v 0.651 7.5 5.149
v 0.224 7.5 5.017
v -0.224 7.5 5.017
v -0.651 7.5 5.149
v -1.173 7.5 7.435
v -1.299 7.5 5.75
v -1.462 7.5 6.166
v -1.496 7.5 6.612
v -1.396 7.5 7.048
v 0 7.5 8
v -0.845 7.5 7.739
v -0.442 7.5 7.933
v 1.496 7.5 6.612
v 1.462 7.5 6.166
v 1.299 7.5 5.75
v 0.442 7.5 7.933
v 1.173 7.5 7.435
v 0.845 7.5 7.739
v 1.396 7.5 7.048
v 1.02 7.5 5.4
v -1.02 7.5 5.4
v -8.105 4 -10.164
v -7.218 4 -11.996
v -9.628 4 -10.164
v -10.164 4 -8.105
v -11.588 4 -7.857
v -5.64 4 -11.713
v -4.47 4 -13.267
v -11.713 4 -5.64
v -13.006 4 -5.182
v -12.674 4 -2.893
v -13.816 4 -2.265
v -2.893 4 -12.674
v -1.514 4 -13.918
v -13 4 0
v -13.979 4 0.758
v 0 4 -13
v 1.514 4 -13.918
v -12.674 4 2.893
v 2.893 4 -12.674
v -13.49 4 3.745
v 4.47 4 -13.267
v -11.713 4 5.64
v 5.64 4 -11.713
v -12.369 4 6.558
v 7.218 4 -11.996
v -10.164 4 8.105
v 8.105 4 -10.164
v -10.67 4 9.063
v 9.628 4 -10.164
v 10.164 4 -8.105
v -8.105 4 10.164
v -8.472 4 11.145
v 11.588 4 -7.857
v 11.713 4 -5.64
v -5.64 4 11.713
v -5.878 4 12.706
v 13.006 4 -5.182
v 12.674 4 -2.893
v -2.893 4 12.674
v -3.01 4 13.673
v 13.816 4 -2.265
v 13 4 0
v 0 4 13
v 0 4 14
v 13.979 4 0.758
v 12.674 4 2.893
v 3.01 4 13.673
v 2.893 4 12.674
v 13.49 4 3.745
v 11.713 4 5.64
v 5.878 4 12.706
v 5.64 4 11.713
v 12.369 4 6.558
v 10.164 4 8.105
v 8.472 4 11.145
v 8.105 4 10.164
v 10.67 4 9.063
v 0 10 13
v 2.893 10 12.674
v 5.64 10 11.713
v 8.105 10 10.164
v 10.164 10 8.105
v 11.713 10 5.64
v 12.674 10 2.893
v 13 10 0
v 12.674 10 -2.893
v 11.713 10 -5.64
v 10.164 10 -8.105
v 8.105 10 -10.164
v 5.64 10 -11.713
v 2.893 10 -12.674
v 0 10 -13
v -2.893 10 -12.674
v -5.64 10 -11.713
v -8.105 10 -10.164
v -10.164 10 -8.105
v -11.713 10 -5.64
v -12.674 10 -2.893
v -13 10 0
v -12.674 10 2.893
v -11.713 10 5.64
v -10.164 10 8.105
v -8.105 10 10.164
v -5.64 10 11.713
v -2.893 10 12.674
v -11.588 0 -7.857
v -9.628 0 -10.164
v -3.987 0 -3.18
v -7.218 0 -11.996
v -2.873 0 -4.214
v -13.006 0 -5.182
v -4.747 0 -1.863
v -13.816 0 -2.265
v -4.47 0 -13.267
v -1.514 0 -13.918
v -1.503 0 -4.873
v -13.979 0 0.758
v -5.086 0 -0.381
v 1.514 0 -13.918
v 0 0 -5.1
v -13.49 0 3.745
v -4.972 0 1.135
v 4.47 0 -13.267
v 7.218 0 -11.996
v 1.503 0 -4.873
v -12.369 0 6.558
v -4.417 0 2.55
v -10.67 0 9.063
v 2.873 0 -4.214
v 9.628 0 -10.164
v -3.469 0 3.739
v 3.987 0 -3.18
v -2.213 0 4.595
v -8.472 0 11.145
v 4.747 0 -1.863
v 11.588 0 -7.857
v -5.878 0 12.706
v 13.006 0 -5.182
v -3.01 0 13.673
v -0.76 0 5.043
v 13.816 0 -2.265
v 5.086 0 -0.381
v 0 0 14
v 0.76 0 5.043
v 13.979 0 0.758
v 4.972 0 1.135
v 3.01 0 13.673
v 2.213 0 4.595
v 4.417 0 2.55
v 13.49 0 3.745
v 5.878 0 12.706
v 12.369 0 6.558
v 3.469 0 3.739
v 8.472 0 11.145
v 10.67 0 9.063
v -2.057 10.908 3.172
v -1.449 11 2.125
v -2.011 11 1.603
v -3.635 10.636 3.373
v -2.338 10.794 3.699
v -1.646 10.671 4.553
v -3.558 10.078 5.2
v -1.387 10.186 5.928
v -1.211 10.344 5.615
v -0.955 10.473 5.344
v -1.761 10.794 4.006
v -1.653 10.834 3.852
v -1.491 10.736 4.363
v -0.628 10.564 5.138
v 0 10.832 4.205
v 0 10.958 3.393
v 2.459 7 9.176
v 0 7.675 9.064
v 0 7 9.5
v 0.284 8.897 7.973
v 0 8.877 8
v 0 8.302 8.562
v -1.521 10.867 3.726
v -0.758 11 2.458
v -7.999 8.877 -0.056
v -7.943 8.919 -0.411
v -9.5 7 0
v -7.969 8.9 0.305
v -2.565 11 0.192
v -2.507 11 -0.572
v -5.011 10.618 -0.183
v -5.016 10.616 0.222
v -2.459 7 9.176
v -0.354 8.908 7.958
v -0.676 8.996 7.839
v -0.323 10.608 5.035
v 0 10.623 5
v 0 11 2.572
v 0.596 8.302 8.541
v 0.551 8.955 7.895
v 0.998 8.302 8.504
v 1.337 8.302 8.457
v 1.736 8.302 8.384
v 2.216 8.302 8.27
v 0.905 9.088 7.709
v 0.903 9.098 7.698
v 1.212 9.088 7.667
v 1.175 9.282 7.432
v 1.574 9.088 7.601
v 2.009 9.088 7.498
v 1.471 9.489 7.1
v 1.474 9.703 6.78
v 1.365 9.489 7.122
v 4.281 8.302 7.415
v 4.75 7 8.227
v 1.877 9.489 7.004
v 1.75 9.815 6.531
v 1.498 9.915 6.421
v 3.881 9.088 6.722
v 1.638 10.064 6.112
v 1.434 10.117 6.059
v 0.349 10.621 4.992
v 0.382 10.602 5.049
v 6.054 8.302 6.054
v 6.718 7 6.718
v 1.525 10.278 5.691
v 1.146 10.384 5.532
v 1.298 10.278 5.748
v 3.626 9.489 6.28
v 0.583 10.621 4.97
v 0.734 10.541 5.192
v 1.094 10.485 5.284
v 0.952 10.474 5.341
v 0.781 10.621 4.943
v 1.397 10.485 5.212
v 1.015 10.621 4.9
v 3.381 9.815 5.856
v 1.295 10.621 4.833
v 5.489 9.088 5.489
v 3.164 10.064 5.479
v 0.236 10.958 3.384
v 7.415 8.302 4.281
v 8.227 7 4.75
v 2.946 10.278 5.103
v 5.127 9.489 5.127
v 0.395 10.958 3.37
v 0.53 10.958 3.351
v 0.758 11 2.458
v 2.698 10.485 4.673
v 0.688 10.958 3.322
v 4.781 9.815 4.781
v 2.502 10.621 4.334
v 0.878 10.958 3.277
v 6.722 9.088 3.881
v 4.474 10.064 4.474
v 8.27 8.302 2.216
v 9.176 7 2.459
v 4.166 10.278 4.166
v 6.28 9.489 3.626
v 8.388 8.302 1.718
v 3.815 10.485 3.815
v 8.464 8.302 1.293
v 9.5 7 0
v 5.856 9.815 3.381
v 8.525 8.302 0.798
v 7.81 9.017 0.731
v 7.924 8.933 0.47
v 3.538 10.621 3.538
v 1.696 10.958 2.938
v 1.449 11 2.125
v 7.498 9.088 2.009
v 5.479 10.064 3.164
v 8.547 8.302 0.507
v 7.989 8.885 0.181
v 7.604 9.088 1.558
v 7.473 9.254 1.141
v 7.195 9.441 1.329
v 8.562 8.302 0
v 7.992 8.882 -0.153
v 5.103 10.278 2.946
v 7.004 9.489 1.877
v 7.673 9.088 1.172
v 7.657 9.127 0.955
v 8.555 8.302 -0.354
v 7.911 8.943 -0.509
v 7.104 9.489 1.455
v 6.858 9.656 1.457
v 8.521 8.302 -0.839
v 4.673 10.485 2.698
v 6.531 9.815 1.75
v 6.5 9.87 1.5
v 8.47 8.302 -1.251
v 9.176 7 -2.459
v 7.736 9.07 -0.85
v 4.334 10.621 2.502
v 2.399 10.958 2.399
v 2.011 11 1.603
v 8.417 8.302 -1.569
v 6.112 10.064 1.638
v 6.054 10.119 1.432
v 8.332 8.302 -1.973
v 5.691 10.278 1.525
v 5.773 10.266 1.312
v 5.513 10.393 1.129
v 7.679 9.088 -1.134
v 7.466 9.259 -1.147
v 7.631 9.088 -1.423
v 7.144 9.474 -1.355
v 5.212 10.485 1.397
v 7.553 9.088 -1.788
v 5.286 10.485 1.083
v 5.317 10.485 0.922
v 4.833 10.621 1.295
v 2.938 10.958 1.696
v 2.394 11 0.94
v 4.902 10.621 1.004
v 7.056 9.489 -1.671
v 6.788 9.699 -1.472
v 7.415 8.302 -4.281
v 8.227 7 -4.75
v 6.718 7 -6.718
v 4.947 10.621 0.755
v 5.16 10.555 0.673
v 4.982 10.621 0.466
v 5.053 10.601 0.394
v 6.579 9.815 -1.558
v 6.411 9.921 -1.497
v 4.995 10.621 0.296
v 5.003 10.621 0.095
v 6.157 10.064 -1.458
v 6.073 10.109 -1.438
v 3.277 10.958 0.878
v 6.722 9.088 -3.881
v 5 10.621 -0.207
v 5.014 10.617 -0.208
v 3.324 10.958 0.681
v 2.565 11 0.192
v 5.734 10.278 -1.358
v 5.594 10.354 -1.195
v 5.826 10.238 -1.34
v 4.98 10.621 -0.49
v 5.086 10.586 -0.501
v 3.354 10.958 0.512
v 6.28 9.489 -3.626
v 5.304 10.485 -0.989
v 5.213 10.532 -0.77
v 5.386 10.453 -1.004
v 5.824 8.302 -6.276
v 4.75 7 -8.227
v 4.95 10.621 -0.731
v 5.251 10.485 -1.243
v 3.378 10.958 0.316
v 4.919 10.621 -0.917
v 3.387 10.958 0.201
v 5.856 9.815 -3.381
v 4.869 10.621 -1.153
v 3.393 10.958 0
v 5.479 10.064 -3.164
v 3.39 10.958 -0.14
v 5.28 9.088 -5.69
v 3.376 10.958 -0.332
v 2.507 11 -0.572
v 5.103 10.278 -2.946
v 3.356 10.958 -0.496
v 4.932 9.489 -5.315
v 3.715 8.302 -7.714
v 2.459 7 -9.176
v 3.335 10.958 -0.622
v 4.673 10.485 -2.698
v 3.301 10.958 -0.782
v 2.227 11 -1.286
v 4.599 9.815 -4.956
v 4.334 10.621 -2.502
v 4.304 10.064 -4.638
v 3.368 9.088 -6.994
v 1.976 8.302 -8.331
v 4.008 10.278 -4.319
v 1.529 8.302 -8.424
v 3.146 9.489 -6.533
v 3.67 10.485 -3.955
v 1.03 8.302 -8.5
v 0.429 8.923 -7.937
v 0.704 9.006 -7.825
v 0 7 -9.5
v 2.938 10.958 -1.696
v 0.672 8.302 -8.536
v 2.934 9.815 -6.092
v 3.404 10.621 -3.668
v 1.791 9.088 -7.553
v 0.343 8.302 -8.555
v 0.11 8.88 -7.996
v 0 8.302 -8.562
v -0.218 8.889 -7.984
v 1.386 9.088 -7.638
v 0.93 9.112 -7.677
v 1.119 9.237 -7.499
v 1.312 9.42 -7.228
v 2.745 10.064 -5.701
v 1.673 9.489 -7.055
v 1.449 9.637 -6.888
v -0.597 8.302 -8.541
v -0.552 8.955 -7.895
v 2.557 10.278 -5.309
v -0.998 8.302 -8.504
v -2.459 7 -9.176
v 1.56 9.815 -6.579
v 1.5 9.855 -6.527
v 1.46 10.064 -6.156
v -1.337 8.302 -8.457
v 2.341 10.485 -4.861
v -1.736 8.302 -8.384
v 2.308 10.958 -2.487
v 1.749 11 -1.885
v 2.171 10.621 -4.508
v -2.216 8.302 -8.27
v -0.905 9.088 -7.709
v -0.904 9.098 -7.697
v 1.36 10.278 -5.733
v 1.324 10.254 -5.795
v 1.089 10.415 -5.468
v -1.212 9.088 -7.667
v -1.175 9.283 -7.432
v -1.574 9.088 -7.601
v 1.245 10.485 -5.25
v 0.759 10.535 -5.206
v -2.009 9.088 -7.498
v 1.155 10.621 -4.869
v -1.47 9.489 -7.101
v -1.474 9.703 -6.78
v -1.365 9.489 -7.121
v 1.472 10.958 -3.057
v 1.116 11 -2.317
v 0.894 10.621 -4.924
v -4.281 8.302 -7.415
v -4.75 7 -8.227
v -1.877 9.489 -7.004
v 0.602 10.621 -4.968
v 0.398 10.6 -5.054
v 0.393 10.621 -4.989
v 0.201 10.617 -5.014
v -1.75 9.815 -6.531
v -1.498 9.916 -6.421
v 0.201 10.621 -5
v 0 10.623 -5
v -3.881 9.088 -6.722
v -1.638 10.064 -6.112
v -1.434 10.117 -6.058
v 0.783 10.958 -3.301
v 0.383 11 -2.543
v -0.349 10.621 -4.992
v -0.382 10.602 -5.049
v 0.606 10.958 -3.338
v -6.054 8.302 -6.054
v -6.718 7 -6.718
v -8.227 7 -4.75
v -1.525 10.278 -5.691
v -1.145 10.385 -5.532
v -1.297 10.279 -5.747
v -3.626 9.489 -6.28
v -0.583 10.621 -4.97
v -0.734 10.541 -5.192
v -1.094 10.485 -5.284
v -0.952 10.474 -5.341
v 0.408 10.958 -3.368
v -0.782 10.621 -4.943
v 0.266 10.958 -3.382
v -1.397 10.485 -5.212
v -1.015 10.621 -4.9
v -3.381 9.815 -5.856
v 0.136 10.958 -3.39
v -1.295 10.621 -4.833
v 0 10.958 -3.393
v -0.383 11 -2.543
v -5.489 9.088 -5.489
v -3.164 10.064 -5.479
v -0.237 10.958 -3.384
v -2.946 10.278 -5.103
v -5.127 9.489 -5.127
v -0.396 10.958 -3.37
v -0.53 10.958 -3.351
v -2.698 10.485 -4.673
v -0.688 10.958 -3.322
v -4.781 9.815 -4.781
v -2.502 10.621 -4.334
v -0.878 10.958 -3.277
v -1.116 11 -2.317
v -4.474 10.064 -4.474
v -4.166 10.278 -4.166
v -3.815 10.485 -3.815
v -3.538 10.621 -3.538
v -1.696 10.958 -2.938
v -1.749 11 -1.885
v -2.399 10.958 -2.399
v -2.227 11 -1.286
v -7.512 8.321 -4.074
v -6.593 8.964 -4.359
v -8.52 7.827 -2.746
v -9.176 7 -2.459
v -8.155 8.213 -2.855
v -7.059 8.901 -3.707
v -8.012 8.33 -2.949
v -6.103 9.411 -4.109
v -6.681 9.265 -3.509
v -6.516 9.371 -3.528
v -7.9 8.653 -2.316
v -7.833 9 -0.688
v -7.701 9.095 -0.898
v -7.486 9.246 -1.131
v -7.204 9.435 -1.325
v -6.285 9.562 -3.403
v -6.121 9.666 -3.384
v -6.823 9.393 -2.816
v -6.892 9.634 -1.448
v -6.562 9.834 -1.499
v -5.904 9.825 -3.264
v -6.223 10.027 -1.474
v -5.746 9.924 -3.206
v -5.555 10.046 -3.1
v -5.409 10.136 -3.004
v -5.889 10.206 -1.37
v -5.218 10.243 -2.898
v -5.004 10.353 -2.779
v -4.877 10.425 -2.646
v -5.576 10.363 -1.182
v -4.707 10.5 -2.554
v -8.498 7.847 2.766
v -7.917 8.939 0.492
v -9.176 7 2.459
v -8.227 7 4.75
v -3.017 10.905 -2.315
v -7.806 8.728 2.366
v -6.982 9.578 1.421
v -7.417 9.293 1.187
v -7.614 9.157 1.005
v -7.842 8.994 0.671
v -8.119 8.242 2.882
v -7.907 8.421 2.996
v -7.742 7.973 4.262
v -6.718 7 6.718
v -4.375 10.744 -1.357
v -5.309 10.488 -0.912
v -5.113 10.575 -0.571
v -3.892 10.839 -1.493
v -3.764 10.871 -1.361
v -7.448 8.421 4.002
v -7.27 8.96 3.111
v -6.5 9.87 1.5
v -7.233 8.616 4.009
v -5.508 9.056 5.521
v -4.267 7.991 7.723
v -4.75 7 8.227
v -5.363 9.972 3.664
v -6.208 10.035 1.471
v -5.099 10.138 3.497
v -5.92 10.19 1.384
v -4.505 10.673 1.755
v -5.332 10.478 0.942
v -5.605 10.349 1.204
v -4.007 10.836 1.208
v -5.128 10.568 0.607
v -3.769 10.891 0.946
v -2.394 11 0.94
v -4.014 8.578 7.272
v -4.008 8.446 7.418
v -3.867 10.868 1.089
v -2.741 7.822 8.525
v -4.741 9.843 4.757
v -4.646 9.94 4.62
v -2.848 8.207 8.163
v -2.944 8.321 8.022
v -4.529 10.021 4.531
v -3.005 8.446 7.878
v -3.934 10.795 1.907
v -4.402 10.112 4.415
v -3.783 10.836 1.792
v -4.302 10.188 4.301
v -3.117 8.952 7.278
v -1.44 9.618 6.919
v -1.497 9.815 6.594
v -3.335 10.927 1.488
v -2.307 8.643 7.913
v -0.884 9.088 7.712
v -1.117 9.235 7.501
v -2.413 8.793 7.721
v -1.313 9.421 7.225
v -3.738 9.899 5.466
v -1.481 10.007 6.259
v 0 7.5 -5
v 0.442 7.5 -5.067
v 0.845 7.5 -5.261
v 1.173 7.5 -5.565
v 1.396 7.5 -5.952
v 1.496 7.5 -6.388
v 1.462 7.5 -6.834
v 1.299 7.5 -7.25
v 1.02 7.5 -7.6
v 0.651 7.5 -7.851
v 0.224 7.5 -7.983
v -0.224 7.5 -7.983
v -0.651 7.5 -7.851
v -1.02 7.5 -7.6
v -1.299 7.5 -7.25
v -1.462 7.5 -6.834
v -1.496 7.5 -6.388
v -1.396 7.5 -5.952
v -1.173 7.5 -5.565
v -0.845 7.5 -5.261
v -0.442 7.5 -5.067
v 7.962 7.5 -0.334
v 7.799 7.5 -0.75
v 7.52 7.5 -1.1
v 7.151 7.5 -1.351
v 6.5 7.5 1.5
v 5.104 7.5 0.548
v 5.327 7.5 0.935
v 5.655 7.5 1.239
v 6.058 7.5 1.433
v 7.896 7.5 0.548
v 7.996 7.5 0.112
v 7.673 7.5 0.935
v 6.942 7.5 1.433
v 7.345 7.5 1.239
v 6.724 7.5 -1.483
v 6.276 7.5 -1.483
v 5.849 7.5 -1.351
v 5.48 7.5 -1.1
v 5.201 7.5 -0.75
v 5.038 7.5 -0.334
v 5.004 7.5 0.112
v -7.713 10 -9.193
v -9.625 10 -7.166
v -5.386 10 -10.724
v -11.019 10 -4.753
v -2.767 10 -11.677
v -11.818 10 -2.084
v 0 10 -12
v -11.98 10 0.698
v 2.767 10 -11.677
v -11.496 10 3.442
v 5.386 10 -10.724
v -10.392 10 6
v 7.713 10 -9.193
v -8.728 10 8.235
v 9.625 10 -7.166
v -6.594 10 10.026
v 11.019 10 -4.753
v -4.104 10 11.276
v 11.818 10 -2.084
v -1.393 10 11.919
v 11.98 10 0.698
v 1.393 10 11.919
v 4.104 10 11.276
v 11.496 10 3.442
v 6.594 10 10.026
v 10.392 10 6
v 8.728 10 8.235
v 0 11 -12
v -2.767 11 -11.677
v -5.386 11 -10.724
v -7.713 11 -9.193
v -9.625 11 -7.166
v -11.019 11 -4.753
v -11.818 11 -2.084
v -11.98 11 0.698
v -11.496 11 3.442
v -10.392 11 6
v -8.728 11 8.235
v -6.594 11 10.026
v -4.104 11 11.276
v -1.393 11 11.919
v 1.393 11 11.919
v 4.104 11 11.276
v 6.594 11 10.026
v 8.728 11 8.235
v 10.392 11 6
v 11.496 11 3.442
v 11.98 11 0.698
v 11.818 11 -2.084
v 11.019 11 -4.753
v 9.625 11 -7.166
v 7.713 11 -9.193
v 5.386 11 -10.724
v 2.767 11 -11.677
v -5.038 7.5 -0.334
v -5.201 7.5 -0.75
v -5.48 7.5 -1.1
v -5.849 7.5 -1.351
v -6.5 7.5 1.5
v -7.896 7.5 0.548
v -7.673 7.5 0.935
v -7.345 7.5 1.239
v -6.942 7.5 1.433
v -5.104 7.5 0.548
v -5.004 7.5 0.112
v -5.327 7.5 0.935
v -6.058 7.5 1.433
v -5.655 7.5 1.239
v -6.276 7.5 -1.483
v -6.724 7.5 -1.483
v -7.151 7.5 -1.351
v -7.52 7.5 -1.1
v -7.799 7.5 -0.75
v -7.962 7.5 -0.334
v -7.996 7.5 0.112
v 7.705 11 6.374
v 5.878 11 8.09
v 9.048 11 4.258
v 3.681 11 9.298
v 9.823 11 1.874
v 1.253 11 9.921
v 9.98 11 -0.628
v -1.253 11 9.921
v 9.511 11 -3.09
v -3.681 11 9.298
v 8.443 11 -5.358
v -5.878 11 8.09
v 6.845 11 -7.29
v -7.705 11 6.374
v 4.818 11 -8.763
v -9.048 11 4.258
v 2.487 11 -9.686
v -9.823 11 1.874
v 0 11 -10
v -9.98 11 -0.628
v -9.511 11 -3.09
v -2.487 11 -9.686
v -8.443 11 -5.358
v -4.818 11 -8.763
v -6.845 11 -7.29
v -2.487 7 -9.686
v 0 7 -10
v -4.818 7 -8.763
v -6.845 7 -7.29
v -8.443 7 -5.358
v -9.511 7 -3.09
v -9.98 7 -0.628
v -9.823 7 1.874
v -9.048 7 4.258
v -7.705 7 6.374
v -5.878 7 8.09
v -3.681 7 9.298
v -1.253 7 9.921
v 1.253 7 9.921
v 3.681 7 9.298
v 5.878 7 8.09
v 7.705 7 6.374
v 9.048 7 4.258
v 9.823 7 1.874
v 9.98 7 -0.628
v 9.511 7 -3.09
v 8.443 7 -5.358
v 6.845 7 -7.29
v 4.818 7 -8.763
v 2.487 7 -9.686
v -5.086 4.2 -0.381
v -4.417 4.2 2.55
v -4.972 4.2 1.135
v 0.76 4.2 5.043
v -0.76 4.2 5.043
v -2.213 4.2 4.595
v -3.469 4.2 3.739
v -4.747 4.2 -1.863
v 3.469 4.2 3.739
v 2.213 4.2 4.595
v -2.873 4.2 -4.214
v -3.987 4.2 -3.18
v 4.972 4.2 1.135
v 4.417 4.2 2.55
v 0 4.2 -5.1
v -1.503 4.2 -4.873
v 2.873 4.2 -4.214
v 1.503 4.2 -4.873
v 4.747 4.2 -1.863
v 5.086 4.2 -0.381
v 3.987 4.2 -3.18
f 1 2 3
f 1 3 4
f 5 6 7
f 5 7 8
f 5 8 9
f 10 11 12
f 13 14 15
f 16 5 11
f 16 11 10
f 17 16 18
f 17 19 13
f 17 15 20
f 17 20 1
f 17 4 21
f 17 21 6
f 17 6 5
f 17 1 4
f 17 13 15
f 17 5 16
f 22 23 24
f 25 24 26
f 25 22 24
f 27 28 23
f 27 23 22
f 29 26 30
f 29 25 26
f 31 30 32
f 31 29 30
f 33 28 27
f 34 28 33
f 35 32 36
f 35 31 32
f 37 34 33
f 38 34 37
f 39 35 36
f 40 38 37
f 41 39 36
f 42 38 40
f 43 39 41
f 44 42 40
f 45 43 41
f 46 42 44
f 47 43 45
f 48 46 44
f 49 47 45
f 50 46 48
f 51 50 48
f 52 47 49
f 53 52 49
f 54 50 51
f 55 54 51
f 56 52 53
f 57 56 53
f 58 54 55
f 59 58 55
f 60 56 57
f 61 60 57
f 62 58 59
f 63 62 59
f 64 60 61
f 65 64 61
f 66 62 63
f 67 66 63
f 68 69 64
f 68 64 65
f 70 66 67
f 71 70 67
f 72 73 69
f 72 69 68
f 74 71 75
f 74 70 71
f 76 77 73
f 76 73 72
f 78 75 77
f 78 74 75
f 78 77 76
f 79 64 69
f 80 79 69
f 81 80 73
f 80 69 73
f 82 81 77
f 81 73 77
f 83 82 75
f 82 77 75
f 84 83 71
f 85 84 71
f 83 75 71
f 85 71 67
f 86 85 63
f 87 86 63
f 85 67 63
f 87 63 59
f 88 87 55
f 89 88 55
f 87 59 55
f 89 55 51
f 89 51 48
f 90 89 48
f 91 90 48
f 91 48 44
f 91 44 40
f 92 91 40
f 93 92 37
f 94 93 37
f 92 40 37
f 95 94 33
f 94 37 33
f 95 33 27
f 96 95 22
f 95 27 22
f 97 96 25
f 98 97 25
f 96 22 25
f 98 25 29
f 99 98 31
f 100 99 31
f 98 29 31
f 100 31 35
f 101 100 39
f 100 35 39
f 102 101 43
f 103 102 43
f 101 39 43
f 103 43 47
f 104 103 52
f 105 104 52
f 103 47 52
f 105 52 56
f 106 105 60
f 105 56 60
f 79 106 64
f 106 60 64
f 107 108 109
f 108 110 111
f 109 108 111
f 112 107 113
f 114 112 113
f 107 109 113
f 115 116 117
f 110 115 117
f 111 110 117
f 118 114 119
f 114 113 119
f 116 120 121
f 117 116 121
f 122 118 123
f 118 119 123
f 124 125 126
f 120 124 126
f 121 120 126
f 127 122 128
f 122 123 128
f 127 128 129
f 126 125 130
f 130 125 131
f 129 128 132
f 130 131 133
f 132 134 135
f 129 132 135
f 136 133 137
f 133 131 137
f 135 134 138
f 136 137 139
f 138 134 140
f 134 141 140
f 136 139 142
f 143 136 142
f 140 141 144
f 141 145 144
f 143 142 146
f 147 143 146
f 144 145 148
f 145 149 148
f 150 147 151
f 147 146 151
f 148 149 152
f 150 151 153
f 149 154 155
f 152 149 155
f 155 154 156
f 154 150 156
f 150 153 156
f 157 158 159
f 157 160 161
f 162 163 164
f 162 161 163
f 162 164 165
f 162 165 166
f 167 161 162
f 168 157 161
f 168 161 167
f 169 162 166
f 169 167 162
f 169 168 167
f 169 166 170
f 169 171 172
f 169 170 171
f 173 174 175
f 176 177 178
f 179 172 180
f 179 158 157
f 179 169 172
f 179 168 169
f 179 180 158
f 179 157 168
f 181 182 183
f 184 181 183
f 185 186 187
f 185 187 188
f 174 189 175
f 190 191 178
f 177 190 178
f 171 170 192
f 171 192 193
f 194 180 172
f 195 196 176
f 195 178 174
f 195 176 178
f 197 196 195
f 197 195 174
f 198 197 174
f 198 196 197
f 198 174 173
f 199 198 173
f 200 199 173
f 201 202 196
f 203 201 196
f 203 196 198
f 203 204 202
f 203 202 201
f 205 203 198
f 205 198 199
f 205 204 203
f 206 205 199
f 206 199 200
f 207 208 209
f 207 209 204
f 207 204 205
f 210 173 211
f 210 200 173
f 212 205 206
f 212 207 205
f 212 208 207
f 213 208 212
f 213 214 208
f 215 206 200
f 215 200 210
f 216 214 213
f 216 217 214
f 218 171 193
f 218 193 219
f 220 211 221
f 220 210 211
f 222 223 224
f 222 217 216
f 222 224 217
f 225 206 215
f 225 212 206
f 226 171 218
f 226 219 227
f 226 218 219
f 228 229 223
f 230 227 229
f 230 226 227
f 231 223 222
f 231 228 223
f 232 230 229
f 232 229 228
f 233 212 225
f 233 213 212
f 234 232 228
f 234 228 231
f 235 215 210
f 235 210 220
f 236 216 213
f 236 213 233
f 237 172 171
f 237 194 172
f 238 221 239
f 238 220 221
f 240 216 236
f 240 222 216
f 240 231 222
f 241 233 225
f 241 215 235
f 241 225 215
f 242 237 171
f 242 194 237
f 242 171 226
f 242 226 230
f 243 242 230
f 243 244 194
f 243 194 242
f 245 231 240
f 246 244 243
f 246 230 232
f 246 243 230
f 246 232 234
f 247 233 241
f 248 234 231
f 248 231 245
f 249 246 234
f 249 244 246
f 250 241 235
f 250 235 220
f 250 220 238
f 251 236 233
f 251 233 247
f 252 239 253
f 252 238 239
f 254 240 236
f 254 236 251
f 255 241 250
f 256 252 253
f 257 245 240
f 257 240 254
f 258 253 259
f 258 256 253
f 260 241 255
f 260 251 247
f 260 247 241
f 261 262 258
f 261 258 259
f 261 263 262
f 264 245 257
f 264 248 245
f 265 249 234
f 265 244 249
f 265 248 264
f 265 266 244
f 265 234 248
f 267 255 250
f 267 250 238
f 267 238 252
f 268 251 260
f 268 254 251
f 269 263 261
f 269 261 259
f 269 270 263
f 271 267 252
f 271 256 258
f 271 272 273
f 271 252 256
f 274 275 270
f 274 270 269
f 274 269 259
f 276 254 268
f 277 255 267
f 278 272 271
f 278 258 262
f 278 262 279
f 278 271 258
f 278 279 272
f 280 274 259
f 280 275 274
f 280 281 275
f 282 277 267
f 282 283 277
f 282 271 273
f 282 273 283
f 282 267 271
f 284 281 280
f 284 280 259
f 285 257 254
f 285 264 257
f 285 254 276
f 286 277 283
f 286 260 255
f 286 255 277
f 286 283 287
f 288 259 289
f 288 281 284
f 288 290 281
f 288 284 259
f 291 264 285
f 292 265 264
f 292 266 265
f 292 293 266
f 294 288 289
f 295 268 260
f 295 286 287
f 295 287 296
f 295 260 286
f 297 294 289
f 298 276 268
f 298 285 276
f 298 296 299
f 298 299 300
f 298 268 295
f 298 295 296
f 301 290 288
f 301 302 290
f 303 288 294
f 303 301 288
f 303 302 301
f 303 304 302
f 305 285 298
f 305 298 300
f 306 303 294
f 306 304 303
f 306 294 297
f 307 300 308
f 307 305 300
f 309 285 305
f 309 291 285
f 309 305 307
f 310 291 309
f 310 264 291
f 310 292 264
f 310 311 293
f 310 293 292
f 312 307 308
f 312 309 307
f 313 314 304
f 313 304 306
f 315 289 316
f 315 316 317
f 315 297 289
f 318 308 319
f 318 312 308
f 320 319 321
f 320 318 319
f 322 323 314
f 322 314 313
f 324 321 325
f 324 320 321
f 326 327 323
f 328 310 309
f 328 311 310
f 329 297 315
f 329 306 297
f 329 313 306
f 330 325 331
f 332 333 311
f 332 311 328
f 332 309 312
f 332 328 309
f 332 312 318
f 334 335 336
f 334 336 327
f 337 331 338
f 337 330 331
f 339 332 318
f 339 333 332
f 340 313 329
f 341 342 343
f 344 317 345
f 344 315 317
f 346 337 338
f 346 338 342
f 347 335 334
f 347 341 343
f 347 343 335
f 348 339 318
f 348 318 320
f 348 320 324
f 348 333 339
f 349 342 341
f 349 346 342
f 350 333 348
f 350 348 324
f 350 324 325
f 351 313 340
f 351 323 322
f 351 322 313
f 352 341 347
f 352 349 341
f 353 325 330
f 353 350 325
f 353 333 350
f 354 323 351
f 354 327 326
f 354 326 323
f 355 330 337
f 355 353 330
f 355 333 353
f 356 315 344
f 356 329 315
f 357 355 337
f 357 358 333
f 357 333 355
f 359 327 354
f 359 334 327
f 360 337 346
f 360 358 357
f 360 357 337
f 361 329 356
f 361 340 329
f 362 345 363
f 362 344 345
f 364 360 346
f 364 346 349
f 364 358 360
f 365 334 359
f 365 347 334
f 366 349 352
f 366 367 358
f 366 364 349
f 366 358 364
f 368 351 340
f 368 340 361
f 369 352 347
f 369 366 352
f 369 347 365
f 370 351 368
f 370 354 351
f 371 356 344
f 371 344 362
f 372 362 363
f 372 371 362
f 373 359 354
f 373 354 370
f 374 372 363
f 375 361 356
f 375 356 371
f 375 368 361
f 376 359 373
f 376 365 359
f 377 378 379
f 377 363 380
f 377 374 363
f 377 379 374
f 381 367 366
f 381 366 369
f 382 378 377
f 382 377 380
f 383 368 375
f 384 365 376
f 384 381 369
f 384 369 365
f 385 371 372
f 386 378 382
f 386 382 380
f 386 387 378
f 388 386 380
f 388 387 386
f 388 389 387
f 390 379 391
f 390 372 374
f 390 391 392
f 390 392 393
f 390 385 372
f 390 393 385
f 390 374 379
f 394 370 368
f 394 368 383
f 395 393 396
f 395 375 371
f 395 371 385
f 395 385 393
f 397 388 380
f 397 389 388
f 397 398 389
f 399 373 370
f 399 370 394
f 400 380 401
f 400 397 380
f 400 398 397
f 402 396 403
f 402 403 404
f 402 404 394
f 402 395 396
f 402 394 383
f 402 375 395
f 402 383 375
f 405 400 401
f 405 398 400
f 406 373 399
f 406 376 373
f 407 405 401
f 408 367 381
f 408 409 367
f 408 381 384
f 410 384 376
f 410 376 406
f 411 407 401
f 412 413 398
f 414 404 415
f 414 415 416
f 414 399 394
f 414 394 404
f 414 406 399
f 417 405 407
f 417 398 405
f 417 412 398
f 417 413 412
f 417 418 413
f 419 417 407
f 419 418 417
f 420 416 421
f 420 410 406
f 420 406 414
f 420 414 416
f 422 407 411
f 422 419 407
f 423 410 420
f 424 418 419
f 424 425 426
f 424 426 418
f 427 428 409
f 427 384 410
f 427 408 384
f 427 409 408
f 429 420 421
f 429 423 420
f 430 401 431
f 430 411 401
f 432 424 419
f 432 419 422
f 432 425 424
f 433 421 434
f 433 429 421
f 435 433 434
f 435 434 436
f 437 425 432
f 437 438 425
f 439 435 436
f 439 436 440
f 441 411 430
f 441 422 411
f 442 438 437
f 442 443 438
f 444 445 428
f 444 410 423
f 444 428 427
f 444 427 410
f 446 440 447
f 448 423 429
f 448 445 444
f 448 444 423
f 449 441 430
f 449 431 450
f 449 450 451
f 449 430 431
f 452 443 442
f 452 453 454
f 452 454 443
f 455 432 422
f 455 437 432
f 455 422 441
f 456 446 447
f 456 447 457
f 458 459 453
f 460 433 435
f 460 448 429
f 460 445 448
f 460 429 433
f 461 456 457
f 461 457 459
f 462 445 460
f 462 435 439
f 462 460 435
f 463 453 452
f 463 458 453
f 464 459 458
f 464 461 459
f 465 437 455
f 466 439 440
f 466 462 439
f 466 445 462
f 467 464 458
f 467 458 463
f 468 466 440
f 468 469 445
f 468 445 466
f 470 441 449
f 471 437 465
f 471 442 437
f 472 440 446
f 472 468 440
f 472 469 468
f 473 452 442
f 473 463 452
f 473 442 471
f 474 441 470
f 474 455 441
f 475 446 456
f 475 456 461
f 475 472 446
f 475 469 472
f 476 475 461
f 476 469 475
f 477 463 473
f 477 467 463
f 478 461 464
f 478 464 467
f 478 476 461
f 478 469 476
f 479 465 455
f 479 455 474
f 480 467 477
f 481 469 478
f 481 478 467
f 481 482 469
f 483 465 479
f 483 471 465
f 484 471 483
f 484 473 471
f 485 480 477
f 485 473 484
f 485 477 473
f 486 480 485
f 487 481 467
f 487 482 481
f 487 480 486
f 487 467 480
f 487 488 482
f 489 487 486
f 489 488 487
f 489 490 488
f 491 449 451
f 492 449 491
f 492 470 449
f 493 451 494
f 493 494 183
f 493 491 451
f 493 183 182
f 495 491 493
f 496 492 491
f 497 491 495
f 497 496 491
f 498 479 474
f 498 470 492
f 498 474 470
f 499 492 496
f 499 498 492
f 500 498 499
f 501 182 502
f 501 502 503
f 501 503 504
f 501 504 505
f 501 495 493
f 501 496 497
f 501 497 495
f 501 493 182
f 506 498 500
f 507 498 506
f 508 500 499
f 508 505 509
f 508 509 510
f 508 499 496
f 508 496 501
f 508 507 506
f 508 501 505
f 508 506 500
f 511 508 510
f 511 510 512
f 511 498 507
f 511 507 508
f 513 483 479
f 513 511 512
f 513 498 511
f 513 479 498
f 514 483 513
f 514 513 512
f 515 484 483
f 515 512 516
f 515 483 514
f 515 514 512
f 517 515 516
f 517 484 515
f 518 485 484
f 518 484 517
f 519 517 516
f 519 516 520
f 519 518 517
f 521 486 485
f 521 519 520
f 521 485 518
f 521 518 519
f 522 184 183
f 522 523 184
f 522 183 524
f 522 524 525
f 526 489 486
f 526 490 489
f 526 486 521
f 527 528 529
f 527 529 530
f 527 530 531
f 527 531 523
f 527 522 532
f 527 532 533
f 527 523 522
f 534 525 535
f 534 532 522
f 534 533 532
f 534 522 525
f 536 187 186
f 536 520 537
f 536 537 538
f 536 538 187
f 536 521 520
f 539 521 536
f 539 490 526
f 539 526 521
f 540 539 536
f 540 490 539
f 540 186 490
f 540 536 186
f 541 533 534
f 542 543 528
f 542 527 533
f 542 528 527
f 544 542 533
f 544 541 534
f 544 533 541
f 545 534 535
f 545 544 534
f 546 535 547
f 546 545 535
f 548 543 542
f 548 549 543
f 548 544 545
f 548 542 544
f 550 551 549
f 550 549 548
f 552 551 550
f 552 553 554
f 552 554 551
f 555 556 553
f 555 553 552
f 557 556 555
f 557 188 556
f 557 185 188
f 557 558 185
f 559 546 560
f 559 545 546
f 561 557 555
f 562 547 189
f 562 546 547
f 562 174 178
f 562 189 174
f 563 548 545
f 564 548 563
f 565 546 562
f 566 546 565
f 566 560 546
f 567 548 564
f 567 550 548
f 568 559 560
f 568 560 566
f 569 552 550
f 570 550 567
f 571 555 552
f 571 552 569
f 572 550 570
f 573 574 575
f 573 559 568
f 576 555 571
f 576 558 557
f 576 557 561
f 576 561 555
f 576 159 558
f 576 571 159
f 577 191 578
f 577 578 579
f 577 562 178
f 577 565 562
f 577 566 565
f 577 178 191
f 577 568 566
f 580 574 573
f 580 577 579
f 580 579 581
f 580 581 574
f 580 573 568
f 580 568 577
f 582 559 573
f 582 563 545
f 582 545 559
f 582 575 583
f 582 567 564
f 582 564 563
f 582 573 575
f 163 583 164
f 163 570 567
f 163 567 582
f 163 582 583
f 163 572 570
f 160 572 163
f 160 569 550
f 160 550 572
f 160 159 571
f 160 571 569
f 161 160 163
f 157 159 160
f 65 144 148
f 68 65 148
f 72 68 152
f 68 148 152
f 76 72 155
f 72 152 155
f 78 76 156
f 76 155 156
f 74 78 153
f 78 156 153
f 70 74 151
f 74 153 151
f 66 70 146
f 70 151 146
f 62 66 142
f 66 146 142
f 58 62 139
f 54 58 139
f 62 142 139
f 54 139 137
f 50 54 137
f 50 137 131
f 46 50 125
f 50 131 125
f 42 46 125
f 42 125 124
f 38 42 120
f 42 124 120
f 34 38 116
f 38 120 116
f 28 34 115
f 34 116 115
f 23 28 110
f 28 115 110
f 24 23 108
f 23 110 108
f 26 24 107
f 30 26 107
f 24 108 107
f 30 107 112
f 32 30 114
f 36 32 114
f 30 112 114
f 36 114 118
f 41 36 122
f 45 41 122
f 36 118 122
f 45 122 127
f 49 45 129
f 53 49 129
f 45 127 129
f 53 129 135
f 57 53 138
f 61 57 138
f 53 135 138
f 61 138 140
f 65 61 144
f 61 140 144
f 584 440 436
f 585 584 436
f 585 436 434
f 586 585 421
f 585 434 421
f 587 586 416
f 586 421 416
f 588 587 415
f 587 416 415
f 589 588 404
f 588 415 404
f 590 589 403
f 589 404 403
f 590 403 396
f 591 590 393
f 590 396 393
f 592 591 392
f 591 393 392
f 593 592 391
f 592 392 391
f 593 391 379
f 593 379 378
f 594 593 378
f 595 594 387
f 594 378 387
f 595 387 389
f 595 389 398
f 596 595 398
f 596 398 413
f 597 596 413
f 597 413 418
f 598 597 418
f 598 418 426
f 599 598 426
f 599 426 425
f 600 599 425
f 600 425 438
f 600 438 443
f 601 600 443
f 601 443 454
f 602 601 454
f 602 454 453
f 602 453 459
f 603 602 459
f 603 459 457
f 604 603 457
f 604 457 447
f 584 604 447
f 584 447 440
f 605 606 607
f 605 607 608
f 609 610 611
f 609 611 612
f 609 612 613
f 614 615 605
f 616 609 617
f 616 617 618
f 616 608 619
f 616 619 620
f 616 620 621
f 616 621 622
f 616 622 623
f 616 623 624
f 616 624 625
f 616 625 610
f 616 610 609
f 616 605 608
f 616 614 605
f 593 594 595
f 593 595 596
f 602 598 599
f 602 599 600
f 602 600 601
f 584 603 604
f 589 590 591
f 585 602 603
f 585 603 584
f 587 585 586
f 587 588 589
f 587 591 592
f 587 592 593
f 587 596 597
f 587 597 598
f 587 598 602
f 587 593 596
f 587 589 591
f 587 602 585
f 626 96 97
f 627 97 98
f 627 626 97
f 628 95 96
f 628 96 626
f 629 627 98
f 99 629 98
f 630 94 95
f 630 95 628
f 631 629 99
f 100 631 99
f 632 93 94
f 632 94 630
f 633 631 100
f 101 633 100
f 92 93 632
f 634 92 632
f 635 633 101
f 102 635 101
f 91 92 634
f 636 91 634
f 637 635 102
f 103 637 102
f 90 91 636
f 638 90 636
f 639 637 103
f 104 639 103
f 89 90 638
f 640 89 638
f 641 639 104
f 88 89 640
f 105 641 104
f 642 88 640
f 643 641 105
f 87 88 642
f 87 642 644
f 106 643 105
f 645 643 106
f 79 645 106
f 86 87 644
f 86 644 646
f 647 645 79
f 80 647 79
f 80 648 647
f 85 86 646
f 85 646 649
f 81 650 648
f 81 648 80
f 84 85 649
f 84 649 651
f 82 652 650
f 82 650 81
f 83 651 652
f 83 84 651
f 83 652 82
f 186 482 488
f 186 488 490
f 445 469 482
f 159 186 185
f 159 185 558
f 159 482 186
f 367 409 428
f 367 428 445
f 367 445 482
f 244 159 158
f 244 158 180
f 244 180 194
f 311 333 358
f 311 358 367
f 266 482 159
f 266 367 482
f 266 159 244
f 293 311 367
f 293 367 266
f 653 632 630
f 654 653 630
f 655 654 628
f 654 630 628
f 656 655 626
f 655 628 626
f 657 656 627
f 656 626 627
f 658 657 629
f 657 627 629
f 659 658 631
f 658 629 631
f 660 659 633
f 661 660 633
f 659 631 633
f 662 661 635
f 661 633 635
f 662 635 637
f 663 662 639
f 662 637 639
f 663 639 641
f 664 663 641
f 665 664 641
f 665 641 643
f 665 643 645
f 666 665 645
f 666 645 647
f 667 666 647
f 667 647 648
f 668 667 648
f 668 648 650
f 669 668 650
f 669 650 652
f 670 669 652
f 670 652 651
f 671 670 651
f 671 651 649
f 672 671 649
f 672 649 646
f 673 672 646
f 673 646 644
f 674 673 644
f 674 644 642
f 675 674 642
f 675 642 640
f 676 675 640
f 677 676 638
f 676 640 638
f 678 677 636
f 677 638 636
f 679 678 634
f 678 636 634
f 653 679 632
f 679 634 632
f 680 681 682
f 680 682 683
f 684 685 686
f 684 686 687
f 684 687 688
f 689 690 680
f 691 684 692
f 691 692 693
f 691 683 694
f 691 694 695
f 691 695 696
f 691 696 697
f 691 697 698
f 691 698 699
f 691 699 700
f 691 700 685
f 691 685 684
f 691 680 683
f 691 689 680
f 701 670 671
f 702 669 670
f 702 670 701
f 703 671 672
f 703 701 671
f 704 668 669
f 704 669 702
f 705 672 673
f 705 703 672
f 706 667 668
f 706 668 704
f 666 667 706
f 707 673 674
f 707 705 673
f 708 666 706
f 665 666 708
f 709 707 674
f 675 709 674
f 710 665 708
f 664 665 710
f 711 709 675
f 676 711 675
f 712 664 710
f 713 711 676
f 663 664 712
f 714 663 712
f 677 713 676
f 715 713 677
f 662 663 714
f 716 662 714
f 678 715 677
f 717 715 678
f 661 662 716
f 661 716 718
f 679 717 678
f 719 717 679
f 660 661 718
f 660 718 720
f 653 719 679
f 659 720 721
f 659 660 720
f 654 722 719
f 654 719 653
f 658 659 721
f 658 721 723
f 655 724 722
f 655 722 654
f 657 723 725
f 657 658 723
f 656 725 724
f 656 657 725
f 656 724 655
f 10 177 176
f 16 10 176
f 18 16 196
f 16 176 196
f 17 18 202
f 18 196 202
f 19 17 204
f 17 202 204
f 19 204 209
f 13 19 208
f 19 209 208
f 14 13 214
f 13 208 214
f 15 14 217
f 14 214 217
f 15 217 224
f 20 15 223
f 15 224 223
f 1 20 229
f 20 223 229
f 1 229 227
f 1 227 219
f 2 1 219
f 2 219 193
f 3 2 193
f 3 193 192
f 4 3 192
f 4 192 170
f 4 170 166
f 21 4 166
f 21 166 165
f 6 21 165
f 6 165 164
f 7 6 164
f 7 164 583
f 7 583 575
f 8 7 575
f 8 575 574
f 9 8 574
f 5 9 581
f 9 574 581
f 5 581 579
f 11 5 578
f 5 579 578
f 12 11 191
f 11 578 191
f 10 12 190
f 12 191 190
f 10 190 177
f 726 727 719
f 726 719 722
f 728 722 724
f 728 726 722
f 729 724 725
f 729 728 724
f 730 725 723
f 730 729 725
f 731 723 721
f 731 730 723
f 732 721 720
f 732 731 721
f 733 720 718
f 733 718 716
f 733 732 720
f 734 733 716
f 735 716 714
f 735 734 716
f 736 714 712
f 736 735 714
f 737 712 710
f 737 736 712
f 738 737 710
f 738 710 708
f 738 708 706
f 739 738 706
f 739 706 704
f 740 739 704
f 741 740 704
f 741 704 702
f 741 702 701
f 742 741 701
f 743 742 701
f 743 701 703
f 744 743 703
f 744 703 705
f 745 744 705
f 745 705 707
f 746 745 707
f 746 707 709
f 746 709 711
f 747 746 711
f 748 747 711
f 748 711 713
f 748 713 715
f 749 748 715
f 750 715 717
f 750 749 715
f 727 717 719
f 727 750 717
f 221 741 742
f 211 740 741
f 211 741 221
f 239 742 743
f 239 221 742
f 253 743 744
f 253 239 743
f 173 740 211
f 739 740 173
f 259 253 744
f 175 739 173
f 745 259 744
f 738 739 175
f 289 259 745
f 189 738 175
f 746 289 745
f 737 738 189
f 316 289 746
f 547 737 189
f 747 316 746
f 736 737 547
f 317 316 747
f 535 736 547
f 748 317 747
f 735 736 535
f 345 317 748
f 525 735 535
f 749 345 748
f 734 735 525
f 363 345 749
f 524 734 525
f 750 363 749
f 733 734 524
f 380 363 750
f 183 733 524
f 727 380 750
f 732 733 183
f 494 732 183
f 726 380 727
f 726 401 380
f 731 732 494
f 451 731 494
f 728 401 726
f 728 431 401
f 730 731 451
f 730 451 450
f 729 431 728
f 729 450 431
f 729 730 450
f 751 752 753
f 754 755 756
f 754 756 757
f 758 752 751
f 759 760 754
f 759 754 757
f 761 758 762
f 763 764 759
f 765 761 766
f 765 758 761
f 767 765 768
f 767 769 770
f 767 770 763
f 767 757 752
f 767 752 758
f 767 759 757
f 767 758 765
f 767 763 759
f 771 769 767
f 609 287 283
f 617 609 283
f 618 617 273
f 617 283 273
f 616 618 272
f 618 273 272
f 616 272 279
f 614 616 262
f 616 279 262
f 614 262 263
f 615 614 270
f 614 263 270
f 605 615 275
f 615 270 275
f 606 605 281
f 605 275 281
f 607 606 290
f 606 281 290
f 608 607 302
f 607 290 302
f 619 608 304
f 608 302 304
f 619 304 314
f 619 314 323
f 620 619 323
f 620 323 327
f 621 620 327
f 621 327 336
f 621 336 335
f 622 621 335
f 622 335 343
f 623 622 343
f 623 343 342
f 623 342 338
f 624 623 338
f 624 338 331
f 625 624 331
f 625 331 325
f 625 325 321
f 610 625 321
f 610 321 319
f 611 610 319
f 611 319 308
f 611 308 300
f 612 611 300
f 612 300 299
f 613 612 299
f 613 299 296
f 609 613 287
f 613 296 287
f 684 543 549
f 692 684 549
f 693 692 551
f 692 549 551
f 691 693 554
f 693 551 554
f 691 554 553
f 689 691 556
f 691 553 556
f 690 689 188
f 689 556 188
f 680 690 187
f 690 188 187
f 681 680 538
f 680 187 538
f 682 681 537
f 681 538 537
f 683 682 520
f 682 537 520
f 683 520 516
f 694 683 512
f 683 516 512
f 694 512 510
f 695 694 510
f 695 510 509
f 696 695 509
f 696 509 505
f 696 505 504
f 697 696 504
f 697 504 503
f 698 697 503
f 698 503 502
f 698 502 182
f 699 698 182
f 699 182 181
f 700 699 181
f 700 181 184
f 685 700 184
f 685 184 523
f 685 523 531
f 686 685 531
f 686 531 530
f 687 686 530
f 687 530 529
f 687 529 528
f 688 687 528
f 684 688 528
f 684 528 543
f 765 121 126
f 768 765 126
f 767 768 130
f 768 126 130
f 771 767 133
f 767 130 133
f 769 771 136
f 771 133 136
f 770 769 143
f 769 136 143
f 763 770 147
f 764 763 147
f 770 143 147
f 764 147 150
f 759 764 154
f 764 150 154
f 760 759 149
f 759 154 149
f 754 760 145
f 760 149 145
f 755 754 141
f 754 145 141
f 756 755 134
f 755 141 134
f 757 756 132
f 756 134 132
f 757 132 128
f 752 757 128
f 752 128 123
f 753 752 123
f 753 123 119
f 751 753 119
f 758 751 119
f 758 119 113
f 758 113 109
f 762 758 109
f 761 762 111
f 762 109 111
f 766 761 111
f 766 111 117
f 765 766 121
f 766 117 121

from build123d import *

# Parameters (mm, degrees)
SKETCH1_R           = 14
BOSS_EXTRUDE1_DEPTH = 4
SKETCH2_R           = 13
SKETCH2_R_2         = 12
BOSS_EXTRUDE2_DEPTH = 6
SKETCH2_3_R         = 12
SKETCH2_3_R_2       = 10
BOSS_EXTRUDE3_DEPTH = 7
SKETCH2_4_R         = 10
BOSS_EXTRUDE4_DEPTH = 3
SKETCH3_R           = 9.5
BOSS_EXTRUDE5_DEPTH = 4
FILLET1_R           = 8
SKETCH5_R           = 1.5
CUT_EXTRUDE1_DEPTH  = 3.5
SKETCH6_R           = 5.1
CUT_EXTRUDE2_DEPTH  = 4.2


with BuildPart() as part:
    # Sketch1 → Boss-Extrude1 (new body)
    with BuildSketch(Plane(origin=(0, 0, 0), x_dir=(1, 0, 0), z_dir=(0, 1, 0))):
        with Locations(Location((0, 0, 0), (0, 0, 270))):
            Circle(SKETCH1_R)
    extrude(amount=BOSS_EXTRUDE1_DEPTH)

    # Sketch2 → Boss-Extrude2 (add)
    with BuildSketch(Plane(origin=(0, 4, 0), x_dir=(1, 0, 0), z_dir=(0, 1, 0))):
        with Locations(Location((0, 0, 0), (0, 0, 270))):
            Circle(SKETCH2_R)
        with Locations(Location((0, 0, 0), (0, 0, 270))):
            Circle(SKETCH2_R_2, mode=Mode.SUBTRACT)
    extrude(amount=BOSS_EXTRUDE2_DEPTH)

    # Sketch2<3> → Boss-Extrude3 (add)
    with BuildSketch(Plane(origin=(0, 4, 0), x_dir=(1, 0, 0), z_dir=(0, 1, 0))):
        with Locations(Location((0, 0, 0), (0, 0, 90))):
            Circle(SKETCH2_3_R)
        with Locations(Location((0, 0, 0), (0, 0, 90))):
            Circle(SKETCH2_3_R_2, mode=Mode.SUBTRACT)
    extrude(amount=BOSS_EXTRUDE3_DEPTH)

    # Sketch2<4> → Boss-Extrude4 (add)
    with BuildSketch(Plane(origin=(0, 4, 0), x_dir=(1, 0, 0), z_dir=(0, 1, 0))):
        with Locations(Location((0, 0, 0), (0, 0, 90))):
            Circle(SKETCH2_4_R)
    extrude(amount=BOSS_EXTRUDE4_DEPTH)

    # Sketch3 → Boss-Extrude5 (add)
    with BuildSketch(Plane(origin=(0, 7, 0), x_dir=(1, 0, 0), z_dir=(0, 1, 0))):
        with Locations(Location((0, 0, 0), (0, 0, 270))):
            Circle(SKETCH3_R)
    extrude(amount=BOSS_EXTRUDE5_DEPTH)

    # Fillet1
    # the kernel refuses this fillet: 8 mm, written as the material it takes off along each edge
    with BuildSketch(Plane(origin=(0, 11, 0), x_dir=(0, 0, 1), z_dir=(-1, 0, 0))) as fillet1_piece_1:
        with BuildLine():
            CenterArc((2.57179677, -8), FILLET1_R, 30, 60)
            Line((2.57179677, 0), (2.57179677, 0.16))
            Line((2.57179677, 0.16), (9.5, 0.16))
            Line((9.5, 0.16), (9.66, 0))
            ThreePointArc((9.66, 0), (9.66, -2), (9.638564065, -3.92))
            Line((9.638564065, -3.92), (9.5, -4))
        make_face()
    revolve(axis=Axis((0, 11, 0), (0, 1, 0)), mode=Mode.SUBTRACT)

    # Sketch5 → Cut-Extrude1 (cut)
    with BuildSketch(Plane(origin=(0, 11, 0), x_dir=(1, 0, 0), z_dir=(0, 1, 0))):
        with Locations(Location((0, 6.5, 0), (0, 0, 270))):
            Circle(SKETCH5_R)
        with Locations(Location((6.5, 0, 0), (0, 0, 270))):
            Circle(SKETCH5_R)
        with Locations(Location((0, -6.5, 0), (0, 0, 270))):
            Circle(SKETCH5_R)
        with Locations(Location((-6.5, 0, 0), (0, 0, 270))):
            Circle(SKETCH5_R)
    extrude(amount=-CUT_EXTRUDE1_DEPTH, mode=Mode.SUBTRACT)

    # Sketch6 → Cut-Extrude2 (cut)
    with BuildSketch(Plane.XZ):
        with Locations(Location((0, 0, 0), (0, 0, 270))):
            Circle(SKETCH6_R)
    extrude(amount=-CUT_EXTRUDE2_DEPTH, mode=Mode.SUBTRACT)


solid = part.part
